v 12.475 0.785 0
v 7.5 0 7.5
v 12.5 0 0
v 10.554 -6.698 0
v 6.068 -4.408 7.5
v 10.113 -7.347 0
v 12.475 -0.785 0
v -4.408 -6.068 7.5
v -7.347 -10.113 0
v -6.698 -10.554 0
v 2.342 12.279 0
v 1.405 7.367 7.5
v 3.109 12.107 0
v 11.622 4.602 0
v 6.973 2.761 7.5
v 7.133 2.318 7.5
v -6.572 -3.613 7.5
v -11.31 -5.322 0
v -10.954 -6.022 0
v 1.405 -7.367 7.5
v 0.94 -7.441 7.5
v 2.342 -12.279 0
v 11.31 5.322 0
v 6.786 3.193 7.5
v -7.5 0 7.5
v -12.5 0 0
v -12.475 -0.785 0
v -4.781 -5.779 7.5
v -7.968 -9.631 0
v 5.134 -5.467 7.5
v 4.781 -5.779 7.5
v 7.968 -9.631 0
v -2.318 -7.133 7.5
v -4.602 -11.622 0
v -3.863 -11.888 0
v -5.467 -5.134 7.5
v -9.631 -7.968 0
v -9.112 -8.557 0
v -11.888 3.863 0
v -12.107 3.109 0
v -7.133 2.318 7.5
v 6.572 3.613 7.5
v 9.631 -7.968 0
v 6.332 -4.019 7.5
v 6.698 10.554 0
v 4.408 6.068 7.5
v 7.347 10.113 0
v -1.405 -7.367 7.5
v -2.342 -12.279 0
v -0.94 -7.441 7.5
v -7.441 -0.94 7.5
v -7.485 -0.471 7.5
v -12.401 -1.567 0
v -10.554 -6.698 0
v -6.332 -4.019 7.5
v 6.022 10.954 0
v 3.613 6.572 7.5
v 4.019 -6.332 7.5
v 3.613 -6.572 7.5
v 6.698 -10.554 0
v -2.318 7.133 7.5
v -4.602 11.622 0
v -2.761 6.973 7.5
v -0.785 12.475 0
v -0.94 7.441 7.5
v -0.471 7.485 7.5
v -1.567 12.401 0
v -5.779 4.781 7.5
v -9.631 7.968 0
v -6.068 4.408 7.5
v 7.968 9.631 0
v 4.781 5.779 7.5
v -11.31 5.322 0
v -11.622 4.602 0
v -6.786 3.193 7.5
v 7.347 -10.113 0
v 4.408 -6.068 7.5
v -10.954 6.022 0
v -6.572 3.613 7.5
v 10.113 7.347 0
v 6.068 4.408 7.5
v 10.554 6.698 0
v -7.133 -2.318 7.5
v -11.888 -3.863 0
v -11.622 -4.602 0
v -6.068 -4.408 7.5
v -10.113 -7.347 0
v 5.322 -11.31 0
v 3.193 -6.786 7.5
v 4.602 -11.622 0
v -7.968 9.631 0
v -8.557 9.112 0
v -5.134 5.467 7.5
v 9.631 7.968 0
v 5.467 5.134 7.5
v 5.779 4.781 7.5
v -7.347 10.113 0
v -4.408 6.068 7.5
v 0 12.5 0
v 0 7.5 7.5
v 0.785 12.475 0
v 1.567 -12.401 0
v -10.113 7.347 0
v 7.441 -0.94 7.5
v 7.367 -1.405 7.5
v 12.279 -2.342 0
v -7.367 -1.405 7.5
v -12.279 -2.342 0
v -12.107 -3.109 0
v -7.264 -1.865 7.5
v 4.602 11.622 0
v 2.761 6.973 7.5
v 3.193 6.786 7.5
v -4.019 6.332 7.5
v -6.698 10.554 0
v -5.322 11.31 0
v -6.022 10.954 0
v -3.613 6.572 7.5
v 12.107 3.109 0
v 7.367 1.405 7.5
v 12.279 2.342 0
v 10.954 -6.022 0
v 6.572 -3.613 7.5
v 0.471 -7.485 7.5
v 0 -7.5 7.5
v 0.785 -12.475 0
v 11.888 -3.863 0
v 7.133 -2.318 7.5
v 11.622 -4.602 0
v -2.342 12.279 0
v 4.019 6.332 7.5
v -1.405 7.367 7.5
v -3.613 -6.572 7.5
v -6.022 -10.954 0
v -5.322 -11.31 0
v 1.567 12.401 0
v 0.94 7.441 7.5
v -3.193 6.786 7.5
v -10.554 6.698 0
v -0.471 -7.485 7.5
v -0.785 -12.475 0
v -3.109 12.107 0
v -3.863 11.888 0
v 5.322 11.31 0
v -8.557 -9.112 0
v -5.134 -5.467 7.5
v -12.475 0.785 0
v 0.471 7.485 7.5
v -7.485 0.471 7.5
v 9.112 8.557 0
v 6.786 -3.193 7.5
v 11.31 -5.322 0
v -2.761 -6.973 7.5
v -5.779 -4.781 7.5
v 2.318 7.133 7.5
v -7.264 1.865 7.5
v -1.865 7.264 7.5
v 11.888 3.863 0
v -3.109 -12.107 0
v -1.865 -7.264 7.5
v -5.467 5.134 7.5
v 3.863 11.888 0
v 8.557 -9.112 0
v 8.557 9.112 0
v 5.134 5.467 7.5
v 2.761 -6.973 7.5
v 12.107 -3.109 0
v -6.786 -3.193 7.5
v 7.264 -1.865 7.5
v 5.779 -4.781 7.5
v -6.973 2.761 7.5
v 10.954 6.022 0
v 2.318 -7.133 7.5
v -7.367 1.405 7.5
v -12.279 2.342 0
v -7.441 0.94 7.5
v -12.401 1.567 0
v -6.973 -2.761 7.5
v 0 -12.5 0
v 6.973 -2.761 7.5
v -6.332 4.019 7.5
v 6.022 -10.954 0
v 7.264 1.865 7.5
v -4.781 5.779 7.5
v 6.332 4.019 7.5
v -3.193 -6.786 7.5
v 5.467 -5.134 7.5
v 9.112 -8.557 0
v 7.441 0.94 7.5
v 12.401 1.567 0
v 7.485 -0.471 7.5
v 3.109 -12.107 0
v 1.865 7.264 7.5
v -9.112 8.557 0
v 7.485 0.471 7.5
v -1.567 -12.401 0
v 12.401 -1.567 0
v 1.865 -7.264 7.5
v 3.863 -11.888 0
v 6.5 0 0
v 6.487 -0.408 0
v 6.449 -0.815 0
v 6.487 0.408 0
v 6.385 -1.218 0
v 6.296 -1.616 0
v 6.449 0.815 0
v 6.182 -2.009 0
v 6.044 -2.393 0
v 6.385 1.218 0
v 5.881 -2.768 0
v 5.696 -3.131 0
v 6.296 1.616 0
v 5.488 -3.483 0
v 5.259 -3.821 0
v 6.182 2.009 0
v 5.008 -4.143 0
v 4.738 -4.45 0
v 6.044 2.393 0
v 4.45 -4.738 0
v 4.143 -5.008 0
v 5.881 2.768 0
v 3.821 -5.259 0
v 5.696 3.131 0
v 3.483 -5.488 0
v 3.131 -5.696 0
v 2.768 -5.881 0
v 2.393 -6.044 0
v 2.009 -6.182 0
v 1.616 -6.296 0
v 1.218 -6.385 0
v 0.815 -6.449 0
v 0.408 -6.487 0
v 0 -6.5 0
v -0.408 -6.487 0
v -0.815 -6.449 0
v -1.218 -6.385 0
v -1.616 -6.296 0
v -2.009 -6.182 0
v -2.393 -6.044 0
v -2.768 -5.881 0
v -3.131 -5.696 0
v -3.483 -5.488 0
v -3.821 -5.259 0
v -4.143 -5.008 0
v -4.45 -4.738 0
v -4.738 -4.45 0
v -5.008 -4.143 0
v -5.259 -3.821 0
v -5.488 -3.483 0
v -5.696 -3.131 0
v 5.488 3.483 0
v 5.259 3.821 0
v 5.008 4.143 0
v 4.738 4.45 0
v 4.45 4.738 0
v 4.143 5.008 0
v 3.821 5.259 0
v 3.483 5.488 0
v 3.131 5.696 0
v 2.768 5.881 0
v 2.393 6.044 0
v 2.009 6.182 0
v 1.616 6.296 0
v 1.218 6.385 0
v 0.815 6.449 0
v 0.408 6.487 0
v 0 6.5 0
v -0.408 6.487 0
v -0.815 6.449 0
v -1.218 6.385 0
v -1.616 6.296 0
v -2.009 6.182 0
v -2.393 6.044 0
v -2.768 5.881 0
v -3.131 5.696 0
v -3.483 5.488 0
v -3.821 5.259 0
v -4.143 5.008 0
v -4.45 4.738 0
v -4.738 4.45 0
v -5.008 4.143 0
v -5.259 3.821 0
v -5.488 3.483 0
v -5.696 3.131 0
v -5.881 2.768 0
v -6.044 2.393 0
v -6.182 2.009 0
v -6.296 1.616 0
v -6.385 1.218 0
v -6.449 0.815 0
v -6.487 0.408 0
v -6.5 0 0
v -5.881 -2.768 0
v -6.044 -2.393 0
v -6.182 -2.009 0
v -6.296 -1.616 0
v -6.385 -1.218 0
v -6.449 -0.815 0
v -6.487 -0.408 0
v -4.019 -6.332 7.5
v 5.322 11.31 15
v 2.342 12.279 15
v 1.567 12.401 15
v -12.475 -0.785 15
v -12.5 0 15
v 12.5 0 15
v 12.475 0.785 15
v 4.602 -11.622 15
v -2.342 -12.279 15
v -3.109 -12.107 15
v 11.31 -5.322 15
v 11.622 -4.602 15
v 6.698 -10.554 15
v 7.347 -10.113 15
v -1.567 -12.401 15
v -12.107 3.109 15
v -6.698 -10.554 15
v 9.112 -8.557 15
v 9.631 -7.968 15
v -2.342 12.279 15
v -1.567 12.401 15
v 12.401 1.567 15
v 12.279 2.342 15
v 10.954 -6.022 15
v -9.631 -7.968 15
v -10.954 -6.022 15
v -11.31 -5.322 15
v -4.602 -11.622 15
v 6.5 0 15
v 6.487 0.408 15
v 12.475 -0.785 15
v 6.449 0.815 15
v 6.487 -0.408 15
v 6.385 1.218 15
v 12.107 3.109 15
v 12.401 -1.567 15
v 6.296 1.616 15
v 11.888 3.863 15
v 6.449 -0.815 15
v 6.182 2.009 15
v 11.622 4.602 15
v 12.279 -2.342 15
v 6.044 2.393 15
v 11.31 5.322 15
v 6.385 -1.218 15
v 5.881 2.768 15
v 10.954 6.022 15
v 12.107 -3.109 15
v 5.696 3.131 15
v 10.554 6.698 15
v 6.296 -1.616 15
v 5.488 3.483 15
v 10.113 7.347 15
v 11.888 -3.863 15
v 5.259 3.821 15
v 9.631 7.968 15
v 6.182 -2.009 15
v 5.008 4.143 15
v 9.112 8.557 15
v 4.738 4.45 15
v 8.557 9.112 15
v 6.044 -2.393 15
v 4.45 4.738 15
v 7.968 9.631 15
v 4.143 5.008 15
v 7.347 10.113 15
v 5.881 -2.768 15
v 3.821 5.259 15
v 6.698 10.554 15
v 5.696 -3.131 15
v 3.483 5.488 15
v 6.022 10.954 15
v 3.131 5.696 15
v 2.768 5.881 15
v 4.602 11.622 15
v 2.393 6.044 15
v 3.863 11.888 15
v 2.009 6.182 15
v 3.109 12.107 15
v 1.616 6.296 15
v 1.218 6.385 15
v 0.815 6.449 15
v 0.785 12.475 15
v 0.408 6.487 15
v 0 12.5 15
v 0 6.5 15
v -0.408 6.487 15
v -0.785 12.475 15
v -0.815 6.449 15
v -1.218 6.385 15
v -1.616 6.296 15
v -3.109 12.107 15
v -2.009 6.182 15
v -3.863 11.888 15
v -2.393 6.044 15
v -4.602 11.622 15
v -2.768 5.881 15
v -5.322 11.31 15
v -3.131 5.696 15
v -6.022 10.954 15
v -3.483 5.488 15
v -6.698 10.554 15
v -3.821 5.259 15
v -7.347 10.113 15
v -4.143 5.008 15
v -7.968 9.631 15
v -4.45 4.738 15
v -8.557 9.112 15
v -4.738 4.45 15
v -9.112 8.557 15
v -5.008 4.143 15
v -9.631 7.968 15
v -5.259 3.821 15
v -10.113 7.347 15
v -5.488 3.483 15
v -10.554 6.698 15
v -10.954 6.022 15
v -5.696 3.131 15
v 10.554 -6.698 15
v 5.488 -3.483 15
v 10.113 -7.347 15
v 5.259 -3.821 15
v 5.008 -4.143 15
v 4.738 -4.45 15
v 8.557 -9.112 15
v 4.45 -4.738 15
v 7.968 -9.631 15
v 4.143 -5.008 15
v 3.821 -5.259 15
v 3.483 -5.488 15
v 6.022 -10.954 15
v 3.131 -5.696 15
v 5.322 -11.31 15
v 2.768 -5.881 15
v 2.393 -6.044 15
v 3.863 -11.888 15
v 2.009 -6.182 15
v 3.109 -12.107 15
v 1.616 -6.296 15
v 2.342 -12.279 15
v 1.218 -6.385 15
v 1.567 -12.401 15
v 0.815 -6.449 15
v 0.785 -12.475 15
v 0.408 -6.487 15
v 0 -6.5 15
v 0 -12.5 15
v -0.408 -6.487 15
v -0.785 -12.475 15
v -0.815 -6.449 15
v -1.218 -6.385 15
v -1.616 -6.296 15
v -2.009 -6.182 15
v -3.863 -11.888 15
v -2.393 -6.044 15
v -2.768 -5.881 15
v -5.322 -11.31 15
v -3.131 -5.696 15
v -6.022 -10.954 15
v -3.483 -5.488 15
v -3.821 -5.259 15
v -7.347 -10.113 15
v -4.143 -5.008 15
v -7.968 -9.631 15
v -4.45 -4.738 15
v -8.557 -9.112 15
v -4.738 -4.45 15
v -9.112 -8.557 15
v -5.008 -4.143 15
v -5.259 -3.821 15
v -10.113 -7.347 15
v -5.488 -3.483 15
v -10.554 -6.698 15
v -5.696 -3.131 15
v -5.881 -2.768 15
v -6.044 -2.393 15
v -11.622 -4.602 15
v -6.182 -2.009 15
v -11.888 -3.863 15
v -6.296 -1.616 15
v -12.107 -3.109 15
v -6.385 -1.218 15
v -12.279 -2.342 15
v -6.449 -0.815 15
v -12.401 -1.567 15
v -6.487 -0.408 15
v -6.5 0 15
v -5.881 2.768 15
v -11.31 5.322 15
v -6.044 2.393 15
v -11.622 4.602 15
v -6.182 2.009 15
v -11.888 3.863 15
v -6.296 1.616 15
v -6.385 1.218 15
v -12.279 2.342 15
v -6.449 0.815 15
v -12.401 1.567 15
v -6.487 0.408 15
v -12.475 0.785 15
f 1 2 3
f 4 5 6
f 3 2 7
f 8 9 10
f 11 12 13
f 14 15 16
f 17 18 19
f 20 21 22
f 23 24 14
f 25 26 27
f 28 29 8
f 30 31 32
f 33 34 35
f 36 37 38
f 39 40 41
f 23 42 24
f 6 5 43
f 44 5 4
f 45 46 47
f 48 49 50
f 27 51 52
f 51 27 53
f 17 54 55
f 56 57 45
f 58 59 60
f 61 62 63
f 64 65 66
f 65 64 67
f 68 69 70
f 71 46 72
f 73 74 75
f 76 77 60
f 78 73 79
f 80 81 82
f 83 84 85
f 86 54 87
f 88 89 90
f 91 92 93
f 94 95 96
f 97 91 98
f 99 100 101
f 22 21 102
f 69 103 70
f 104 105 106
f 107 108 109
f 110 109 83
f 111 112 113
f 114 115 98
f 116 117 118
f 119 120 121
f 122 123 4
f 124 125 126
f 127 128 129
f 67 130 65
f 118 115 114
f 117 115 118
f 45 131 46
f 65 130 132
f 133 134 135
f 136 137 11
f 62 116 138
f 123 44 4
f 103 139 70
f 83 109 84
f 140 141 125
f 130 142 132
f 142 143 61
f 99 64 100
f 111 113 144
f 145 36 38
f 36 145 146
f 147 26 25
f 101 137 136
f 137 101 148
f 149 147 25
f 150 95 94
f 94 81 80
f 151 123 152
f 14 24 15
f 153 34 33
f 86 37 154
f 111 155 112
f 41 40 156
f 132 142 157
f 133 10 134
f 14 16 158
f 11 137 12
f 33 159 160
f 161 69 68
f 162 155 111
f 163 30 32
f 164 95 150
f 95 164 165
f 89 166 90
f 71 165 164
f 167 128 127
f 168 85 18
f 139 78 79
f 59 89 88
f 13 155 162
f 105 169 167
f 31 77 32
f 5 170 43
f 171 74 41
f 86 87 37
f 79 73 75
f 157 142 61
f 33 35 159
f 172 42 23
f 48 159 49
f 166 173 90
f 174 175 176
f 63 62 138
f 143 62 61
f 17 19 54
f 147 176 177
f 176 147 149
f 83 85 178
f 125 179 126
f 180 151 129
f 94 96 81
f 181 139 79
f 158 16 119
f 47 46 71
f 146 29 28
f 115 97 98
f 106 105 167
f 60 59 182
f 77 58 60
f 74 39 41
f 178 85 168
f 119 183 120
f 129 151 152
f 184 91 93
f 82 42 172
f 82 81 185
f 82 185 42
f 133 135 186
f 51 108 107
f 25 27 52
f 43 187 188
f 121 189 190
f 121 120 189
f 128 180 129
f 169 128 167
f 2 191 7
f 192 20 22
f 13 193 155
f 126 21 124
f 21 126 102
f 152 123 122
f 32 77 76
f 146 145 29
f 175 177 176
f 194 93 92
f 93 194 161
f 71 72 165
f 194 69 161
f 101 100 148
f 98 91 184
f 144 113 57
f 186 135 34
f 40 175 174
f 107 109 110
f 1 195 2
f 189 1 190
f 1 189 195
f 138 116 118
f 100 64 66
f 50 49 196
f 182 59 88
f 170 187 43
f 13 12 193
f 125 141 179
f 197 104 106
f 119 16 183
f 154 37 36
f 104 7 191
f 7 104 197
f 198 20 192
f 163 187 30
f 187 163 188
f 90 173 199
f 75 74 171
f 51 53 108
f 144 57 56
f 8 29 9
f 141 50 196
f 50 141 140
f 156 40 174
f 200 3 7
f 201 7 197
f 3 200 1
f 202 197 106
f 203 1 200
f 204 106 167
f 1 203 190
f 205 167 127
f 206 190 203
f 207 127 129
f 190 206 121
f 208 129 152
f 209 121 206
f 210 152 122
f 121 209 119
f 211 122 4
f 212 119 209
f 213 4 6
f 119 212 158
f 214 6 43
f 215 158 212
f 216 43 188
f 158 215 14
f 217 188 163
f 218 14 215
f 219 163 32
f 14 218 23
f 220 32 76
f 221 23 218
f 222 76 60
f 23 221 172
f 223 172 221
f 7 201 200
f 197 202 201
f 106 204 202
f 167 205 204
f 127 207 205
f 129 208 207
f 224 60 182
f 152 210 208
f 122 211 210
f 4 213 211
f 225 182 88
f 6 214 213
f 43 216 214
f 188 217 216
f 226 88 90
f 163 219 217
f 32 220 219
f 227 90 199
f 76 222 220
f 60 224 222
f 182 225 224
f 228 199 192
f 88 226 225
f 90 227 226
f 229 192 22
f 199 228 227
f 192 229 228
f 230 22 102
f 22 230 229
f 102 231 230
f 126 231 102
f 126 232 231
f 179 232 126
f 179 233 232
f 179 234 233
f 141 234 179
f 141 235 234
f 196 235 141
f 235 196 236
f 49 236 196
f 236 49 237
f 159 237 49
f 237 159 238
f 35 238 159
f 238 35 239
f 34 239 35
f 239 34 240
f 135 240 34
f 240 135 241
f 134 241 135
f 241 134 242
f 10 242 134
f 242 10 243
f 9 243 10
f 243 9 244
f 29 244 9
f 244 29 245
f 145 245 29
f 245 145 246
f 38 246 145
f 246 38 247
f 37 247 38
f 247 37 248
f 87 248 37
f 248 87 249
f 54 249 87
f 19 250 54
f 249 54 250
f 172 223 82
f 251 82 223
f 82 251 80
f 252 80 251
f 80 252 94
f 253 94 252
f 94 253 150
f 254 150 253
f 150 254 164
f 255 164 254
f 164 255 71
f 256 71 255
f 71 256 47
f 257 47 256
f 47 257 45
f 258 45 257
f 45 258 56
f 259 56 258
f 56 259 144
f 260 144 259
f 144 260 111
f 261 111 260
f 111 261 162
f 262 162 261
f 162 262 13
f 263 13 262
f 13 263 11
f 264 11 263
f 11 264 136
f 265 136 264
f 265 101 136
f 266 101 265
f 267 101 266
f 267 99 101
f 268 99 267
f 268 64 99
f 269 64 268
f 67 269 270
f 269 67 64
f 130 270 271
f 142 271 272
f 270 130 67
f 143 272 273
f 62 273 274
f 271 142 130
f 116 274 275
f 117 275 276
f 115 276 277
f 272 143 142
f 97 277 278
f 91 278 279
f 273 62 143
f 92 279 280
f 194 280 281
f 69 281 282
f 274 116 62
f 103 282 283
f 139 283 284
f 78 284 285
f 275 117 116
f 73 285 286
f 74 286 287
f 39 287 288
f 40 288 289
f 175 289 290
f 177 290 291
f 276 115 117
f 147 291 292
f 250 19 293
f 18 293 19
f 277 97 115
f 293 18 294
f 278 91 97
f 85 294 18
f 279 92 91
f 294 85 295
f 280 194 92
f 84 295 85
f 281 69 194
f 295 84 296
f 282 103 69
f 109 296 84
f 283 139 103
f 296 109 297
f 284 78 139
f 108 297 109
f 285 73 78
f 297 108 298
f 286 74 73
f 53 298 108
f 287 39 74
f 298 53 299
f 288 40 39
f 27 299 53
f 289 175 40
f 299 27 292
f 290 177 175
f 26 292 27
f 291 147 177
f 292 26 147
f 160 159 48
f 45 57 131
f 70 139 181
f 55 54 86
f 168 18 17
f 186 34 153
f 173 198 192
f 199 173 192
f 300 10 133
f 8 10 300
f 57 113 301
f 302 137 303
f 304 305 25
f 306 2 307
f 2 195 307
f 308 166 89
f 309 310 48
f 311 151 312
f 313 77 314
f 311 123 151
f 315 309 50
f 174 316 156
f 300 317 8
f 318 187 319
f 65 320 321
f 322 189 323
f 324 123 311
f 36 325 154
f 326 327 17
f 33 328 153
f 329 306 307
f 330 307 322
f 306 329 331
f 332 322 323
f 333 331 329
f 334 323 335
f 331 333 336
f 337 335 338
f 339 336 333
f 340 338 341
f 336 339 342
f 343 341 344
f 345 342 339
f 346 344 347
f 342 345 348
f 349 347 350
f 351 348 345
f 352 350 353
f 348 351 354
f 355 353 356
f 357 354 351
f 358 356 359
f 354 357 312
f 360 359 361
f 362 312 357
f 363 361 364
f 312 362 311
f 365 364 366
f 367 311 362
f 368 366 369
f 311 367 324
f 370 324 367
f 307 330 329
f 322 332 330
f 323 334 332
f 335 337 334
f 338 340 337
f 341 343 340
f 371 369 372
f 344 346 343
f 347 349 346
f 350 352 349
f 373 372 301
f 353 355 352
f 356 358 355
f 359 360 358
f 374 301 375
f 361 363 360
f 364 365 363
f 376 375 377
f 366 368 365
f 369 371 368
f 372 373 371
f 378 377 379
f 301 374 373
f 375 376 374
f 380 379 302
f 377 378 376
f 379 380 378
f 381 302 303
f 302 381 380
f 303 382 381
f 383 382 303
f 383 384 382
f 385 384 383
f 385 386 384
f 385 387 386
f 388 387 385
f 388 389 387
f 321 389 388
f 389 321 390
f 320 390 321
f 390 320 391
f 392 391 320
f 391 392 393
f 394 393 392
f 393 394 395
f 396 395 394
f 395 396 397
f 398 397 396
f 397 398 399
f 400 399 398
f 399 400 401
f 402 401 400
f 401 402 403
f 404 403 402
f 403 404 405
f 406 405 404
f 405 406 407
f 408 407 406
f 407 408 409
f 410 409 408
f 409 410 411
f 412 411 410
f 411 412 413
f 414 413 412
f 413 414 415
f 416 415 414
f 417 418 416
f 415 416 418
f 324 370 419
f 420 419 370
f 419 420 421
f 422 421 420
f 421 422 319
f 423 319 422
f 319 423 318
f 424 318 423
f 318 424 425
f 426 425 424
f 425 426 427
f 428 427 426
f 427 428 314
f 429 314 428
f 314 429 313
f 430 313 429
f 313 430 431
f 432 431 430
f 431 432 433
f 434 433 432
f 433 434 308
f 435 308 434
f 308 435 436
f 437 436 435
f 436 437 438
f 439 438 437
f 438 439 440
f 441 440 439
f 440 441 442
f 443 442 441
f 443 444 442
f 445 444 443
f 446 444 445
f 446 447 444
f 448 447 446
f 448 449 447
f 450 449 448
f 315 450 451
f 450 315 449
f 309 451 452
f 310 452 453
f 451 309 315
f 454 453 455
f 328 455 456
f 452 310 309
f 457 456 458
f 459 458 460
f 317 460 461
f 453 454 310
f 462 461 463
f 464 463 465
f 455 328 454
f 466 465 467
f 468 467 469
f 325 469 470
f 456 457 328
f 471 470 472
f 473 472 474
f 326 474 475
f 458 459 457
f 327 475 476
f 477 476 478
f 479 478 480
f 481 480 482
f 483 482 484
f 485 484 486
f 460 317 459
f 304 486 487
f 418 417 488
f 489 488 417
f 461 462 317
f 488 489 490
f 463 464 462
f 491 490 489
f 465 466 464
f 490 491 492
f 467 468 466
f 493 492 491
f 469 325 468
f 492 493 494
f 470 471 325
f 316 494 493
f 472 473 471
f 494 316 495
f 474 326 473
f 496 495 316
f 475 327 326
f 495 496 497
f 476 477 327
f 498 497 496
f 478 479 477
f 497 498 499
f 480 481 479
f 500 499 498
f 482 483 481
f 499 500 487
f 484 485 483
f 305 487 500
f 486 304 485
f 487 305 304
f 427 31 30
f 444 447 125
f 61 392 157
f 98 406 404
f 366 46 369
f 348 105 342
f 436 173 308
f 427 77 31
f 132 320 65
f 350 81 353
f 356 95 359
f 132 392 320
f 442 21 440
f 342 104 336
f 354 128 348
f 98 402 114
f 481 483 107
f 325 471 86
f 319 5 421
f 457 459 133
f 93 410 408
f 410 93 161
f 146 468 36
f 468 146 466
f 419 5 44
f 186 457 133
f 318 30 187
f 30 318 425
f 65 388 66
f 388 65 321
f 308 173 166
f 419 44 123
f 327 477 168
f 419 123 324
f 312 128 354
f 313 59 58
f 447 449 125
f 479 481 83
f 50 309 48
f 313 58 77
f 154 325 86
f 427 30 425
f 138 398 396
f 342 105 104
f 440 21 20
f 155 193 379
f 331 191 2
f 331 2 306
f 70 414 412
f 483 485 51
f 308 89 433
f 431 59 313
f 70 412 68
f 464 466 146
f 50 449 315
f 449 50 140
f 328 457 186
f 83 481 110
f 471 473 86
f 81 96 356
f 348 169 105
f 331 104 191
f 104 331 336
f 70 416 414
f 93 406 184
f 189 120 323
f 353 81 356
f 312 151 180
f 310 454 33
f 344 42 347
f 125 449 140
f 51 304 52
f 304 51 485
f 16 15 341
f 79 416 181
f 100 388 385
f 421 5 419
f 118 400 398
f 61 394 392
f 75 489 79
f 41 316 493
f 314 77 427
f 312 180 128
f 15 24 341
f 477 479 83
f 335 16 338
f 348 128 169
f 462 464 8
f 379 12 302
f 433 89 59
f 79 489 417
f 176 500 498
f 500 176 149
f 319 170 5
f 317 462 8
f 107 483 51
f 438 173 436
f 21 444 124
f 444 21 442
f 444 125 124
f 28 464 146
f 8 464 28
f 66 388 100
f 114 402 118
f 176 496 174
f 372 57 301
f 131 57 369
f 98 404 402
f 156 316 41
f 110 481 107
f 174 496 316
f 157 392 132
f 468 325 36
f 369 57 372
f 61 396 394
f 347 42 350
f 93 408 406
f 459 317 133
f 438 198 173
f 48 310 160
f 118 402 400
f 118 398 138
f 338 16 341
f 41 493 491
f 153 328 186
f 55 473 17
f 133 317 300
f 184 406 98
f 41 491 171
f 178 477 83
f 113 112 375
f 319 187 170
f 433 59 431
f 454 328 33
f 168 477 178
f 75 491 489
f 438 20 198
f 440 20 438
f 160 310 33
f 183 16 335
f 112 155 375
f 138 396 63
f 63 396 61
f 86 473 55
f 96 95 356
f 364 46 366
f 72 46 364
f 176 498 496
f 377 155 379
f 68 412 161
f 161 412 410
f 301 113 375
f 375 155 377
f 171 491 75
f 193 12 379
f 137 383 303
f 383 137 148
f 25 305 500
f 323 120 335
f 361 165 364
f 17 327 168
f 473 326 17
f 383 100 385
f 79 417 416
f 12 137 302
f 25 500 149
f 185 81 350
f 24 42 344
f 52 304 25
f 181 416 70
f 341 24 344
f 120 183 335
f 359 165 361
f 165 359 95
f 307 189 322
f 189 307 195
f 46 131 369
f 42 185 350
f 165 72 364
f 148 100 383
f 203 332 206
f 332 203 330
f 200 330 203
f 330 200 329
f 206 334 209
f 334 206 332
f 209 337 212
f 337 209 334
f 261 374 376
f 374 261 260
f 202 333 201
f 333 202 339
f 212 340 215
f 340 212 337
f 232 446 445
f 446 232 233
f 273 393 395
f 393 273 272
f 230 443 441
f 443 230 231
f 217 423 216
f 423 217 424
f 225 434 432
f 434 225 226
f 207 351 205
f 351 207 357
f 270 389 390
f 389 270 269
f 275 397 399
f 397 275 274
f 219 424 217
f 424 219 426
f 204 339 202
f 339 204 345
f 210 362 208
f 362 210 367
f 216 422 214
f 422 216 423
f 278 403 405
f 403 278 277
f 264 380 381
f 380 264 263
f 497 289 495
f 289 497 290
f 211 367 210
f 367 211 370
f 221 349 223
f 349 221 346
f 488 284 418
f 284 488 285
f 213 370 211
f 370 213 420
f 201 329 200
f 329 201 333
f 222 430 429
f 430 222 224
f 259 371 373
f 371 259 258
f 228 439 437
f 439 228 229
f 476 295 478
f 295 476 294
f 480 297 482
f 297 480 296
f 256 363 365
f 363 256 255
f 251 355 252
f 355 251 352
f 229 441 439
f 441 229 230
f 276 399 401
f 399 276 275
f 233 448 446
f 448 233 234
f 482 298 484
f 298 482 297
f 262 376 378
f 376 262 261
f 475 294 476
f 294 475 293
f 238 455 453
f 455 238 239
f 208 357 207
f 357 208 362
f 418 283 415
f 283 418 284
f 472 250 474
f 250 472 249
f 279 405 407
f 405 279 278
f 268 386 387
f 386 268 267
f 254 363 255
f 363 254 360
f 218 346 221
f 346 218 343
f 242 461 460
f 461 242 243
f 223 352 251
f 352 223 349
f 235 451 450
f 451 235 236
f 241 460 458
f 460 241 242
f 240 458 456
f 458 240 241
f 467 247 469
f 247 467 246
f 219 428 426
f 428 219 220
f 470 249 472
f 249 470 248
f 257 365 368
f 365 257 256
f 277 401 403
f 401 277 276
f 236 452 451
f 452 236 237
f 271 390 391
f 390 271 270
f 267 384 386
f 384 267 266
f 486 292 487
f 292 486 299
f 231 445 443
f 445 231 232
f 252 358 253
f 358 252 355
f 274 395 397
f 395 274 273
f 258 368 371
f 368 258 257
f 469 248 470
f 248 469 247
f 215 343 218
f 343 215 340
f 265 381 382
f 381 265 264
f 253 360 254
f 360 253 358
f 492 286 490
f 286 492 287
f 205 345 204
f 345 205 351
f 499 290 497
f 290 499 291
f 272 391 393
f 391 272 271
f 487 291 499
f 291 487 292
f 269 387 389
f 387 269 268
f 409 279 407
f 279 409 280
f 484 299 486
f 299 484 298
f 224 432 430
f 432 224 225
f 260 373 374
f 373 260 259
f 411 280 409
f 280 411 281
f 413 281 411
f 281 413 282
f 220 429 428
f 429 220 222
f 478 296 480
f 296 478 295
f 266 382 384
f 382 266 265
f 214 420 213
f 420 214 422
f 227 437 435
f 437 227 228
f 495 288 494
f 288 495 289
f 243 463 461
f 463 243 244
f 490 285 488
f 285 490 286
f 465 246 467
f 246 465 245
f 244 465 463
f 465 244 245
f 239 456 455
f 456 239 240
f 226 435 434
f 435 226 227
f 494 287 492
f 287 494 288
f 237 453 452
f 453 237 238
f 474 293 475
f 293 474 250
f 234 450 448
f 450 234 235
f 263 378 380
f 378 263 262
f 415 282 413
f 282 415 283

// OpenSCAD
module roller(
        hole_diameter = 13,
        height = 15,
        min_diameter = 15,
        max_diameter = 15 + 10) {
    difference() {
        union() {
            cylinder(d1 = max_diameter, d2 = min_diameter, h = height / 2, $fn = 100);
            translate([0, 0, height / 2]) {
                cylinder(d1 = min_diameter, d2 = max_diameter, h = height / 2, $fn = 100);
            }
        }
        translate([0, 0, -0.1]) {
            cylinder(d = hole_diameter, h = height + 1, $fn = 100);
        }
    }
}

roller();
